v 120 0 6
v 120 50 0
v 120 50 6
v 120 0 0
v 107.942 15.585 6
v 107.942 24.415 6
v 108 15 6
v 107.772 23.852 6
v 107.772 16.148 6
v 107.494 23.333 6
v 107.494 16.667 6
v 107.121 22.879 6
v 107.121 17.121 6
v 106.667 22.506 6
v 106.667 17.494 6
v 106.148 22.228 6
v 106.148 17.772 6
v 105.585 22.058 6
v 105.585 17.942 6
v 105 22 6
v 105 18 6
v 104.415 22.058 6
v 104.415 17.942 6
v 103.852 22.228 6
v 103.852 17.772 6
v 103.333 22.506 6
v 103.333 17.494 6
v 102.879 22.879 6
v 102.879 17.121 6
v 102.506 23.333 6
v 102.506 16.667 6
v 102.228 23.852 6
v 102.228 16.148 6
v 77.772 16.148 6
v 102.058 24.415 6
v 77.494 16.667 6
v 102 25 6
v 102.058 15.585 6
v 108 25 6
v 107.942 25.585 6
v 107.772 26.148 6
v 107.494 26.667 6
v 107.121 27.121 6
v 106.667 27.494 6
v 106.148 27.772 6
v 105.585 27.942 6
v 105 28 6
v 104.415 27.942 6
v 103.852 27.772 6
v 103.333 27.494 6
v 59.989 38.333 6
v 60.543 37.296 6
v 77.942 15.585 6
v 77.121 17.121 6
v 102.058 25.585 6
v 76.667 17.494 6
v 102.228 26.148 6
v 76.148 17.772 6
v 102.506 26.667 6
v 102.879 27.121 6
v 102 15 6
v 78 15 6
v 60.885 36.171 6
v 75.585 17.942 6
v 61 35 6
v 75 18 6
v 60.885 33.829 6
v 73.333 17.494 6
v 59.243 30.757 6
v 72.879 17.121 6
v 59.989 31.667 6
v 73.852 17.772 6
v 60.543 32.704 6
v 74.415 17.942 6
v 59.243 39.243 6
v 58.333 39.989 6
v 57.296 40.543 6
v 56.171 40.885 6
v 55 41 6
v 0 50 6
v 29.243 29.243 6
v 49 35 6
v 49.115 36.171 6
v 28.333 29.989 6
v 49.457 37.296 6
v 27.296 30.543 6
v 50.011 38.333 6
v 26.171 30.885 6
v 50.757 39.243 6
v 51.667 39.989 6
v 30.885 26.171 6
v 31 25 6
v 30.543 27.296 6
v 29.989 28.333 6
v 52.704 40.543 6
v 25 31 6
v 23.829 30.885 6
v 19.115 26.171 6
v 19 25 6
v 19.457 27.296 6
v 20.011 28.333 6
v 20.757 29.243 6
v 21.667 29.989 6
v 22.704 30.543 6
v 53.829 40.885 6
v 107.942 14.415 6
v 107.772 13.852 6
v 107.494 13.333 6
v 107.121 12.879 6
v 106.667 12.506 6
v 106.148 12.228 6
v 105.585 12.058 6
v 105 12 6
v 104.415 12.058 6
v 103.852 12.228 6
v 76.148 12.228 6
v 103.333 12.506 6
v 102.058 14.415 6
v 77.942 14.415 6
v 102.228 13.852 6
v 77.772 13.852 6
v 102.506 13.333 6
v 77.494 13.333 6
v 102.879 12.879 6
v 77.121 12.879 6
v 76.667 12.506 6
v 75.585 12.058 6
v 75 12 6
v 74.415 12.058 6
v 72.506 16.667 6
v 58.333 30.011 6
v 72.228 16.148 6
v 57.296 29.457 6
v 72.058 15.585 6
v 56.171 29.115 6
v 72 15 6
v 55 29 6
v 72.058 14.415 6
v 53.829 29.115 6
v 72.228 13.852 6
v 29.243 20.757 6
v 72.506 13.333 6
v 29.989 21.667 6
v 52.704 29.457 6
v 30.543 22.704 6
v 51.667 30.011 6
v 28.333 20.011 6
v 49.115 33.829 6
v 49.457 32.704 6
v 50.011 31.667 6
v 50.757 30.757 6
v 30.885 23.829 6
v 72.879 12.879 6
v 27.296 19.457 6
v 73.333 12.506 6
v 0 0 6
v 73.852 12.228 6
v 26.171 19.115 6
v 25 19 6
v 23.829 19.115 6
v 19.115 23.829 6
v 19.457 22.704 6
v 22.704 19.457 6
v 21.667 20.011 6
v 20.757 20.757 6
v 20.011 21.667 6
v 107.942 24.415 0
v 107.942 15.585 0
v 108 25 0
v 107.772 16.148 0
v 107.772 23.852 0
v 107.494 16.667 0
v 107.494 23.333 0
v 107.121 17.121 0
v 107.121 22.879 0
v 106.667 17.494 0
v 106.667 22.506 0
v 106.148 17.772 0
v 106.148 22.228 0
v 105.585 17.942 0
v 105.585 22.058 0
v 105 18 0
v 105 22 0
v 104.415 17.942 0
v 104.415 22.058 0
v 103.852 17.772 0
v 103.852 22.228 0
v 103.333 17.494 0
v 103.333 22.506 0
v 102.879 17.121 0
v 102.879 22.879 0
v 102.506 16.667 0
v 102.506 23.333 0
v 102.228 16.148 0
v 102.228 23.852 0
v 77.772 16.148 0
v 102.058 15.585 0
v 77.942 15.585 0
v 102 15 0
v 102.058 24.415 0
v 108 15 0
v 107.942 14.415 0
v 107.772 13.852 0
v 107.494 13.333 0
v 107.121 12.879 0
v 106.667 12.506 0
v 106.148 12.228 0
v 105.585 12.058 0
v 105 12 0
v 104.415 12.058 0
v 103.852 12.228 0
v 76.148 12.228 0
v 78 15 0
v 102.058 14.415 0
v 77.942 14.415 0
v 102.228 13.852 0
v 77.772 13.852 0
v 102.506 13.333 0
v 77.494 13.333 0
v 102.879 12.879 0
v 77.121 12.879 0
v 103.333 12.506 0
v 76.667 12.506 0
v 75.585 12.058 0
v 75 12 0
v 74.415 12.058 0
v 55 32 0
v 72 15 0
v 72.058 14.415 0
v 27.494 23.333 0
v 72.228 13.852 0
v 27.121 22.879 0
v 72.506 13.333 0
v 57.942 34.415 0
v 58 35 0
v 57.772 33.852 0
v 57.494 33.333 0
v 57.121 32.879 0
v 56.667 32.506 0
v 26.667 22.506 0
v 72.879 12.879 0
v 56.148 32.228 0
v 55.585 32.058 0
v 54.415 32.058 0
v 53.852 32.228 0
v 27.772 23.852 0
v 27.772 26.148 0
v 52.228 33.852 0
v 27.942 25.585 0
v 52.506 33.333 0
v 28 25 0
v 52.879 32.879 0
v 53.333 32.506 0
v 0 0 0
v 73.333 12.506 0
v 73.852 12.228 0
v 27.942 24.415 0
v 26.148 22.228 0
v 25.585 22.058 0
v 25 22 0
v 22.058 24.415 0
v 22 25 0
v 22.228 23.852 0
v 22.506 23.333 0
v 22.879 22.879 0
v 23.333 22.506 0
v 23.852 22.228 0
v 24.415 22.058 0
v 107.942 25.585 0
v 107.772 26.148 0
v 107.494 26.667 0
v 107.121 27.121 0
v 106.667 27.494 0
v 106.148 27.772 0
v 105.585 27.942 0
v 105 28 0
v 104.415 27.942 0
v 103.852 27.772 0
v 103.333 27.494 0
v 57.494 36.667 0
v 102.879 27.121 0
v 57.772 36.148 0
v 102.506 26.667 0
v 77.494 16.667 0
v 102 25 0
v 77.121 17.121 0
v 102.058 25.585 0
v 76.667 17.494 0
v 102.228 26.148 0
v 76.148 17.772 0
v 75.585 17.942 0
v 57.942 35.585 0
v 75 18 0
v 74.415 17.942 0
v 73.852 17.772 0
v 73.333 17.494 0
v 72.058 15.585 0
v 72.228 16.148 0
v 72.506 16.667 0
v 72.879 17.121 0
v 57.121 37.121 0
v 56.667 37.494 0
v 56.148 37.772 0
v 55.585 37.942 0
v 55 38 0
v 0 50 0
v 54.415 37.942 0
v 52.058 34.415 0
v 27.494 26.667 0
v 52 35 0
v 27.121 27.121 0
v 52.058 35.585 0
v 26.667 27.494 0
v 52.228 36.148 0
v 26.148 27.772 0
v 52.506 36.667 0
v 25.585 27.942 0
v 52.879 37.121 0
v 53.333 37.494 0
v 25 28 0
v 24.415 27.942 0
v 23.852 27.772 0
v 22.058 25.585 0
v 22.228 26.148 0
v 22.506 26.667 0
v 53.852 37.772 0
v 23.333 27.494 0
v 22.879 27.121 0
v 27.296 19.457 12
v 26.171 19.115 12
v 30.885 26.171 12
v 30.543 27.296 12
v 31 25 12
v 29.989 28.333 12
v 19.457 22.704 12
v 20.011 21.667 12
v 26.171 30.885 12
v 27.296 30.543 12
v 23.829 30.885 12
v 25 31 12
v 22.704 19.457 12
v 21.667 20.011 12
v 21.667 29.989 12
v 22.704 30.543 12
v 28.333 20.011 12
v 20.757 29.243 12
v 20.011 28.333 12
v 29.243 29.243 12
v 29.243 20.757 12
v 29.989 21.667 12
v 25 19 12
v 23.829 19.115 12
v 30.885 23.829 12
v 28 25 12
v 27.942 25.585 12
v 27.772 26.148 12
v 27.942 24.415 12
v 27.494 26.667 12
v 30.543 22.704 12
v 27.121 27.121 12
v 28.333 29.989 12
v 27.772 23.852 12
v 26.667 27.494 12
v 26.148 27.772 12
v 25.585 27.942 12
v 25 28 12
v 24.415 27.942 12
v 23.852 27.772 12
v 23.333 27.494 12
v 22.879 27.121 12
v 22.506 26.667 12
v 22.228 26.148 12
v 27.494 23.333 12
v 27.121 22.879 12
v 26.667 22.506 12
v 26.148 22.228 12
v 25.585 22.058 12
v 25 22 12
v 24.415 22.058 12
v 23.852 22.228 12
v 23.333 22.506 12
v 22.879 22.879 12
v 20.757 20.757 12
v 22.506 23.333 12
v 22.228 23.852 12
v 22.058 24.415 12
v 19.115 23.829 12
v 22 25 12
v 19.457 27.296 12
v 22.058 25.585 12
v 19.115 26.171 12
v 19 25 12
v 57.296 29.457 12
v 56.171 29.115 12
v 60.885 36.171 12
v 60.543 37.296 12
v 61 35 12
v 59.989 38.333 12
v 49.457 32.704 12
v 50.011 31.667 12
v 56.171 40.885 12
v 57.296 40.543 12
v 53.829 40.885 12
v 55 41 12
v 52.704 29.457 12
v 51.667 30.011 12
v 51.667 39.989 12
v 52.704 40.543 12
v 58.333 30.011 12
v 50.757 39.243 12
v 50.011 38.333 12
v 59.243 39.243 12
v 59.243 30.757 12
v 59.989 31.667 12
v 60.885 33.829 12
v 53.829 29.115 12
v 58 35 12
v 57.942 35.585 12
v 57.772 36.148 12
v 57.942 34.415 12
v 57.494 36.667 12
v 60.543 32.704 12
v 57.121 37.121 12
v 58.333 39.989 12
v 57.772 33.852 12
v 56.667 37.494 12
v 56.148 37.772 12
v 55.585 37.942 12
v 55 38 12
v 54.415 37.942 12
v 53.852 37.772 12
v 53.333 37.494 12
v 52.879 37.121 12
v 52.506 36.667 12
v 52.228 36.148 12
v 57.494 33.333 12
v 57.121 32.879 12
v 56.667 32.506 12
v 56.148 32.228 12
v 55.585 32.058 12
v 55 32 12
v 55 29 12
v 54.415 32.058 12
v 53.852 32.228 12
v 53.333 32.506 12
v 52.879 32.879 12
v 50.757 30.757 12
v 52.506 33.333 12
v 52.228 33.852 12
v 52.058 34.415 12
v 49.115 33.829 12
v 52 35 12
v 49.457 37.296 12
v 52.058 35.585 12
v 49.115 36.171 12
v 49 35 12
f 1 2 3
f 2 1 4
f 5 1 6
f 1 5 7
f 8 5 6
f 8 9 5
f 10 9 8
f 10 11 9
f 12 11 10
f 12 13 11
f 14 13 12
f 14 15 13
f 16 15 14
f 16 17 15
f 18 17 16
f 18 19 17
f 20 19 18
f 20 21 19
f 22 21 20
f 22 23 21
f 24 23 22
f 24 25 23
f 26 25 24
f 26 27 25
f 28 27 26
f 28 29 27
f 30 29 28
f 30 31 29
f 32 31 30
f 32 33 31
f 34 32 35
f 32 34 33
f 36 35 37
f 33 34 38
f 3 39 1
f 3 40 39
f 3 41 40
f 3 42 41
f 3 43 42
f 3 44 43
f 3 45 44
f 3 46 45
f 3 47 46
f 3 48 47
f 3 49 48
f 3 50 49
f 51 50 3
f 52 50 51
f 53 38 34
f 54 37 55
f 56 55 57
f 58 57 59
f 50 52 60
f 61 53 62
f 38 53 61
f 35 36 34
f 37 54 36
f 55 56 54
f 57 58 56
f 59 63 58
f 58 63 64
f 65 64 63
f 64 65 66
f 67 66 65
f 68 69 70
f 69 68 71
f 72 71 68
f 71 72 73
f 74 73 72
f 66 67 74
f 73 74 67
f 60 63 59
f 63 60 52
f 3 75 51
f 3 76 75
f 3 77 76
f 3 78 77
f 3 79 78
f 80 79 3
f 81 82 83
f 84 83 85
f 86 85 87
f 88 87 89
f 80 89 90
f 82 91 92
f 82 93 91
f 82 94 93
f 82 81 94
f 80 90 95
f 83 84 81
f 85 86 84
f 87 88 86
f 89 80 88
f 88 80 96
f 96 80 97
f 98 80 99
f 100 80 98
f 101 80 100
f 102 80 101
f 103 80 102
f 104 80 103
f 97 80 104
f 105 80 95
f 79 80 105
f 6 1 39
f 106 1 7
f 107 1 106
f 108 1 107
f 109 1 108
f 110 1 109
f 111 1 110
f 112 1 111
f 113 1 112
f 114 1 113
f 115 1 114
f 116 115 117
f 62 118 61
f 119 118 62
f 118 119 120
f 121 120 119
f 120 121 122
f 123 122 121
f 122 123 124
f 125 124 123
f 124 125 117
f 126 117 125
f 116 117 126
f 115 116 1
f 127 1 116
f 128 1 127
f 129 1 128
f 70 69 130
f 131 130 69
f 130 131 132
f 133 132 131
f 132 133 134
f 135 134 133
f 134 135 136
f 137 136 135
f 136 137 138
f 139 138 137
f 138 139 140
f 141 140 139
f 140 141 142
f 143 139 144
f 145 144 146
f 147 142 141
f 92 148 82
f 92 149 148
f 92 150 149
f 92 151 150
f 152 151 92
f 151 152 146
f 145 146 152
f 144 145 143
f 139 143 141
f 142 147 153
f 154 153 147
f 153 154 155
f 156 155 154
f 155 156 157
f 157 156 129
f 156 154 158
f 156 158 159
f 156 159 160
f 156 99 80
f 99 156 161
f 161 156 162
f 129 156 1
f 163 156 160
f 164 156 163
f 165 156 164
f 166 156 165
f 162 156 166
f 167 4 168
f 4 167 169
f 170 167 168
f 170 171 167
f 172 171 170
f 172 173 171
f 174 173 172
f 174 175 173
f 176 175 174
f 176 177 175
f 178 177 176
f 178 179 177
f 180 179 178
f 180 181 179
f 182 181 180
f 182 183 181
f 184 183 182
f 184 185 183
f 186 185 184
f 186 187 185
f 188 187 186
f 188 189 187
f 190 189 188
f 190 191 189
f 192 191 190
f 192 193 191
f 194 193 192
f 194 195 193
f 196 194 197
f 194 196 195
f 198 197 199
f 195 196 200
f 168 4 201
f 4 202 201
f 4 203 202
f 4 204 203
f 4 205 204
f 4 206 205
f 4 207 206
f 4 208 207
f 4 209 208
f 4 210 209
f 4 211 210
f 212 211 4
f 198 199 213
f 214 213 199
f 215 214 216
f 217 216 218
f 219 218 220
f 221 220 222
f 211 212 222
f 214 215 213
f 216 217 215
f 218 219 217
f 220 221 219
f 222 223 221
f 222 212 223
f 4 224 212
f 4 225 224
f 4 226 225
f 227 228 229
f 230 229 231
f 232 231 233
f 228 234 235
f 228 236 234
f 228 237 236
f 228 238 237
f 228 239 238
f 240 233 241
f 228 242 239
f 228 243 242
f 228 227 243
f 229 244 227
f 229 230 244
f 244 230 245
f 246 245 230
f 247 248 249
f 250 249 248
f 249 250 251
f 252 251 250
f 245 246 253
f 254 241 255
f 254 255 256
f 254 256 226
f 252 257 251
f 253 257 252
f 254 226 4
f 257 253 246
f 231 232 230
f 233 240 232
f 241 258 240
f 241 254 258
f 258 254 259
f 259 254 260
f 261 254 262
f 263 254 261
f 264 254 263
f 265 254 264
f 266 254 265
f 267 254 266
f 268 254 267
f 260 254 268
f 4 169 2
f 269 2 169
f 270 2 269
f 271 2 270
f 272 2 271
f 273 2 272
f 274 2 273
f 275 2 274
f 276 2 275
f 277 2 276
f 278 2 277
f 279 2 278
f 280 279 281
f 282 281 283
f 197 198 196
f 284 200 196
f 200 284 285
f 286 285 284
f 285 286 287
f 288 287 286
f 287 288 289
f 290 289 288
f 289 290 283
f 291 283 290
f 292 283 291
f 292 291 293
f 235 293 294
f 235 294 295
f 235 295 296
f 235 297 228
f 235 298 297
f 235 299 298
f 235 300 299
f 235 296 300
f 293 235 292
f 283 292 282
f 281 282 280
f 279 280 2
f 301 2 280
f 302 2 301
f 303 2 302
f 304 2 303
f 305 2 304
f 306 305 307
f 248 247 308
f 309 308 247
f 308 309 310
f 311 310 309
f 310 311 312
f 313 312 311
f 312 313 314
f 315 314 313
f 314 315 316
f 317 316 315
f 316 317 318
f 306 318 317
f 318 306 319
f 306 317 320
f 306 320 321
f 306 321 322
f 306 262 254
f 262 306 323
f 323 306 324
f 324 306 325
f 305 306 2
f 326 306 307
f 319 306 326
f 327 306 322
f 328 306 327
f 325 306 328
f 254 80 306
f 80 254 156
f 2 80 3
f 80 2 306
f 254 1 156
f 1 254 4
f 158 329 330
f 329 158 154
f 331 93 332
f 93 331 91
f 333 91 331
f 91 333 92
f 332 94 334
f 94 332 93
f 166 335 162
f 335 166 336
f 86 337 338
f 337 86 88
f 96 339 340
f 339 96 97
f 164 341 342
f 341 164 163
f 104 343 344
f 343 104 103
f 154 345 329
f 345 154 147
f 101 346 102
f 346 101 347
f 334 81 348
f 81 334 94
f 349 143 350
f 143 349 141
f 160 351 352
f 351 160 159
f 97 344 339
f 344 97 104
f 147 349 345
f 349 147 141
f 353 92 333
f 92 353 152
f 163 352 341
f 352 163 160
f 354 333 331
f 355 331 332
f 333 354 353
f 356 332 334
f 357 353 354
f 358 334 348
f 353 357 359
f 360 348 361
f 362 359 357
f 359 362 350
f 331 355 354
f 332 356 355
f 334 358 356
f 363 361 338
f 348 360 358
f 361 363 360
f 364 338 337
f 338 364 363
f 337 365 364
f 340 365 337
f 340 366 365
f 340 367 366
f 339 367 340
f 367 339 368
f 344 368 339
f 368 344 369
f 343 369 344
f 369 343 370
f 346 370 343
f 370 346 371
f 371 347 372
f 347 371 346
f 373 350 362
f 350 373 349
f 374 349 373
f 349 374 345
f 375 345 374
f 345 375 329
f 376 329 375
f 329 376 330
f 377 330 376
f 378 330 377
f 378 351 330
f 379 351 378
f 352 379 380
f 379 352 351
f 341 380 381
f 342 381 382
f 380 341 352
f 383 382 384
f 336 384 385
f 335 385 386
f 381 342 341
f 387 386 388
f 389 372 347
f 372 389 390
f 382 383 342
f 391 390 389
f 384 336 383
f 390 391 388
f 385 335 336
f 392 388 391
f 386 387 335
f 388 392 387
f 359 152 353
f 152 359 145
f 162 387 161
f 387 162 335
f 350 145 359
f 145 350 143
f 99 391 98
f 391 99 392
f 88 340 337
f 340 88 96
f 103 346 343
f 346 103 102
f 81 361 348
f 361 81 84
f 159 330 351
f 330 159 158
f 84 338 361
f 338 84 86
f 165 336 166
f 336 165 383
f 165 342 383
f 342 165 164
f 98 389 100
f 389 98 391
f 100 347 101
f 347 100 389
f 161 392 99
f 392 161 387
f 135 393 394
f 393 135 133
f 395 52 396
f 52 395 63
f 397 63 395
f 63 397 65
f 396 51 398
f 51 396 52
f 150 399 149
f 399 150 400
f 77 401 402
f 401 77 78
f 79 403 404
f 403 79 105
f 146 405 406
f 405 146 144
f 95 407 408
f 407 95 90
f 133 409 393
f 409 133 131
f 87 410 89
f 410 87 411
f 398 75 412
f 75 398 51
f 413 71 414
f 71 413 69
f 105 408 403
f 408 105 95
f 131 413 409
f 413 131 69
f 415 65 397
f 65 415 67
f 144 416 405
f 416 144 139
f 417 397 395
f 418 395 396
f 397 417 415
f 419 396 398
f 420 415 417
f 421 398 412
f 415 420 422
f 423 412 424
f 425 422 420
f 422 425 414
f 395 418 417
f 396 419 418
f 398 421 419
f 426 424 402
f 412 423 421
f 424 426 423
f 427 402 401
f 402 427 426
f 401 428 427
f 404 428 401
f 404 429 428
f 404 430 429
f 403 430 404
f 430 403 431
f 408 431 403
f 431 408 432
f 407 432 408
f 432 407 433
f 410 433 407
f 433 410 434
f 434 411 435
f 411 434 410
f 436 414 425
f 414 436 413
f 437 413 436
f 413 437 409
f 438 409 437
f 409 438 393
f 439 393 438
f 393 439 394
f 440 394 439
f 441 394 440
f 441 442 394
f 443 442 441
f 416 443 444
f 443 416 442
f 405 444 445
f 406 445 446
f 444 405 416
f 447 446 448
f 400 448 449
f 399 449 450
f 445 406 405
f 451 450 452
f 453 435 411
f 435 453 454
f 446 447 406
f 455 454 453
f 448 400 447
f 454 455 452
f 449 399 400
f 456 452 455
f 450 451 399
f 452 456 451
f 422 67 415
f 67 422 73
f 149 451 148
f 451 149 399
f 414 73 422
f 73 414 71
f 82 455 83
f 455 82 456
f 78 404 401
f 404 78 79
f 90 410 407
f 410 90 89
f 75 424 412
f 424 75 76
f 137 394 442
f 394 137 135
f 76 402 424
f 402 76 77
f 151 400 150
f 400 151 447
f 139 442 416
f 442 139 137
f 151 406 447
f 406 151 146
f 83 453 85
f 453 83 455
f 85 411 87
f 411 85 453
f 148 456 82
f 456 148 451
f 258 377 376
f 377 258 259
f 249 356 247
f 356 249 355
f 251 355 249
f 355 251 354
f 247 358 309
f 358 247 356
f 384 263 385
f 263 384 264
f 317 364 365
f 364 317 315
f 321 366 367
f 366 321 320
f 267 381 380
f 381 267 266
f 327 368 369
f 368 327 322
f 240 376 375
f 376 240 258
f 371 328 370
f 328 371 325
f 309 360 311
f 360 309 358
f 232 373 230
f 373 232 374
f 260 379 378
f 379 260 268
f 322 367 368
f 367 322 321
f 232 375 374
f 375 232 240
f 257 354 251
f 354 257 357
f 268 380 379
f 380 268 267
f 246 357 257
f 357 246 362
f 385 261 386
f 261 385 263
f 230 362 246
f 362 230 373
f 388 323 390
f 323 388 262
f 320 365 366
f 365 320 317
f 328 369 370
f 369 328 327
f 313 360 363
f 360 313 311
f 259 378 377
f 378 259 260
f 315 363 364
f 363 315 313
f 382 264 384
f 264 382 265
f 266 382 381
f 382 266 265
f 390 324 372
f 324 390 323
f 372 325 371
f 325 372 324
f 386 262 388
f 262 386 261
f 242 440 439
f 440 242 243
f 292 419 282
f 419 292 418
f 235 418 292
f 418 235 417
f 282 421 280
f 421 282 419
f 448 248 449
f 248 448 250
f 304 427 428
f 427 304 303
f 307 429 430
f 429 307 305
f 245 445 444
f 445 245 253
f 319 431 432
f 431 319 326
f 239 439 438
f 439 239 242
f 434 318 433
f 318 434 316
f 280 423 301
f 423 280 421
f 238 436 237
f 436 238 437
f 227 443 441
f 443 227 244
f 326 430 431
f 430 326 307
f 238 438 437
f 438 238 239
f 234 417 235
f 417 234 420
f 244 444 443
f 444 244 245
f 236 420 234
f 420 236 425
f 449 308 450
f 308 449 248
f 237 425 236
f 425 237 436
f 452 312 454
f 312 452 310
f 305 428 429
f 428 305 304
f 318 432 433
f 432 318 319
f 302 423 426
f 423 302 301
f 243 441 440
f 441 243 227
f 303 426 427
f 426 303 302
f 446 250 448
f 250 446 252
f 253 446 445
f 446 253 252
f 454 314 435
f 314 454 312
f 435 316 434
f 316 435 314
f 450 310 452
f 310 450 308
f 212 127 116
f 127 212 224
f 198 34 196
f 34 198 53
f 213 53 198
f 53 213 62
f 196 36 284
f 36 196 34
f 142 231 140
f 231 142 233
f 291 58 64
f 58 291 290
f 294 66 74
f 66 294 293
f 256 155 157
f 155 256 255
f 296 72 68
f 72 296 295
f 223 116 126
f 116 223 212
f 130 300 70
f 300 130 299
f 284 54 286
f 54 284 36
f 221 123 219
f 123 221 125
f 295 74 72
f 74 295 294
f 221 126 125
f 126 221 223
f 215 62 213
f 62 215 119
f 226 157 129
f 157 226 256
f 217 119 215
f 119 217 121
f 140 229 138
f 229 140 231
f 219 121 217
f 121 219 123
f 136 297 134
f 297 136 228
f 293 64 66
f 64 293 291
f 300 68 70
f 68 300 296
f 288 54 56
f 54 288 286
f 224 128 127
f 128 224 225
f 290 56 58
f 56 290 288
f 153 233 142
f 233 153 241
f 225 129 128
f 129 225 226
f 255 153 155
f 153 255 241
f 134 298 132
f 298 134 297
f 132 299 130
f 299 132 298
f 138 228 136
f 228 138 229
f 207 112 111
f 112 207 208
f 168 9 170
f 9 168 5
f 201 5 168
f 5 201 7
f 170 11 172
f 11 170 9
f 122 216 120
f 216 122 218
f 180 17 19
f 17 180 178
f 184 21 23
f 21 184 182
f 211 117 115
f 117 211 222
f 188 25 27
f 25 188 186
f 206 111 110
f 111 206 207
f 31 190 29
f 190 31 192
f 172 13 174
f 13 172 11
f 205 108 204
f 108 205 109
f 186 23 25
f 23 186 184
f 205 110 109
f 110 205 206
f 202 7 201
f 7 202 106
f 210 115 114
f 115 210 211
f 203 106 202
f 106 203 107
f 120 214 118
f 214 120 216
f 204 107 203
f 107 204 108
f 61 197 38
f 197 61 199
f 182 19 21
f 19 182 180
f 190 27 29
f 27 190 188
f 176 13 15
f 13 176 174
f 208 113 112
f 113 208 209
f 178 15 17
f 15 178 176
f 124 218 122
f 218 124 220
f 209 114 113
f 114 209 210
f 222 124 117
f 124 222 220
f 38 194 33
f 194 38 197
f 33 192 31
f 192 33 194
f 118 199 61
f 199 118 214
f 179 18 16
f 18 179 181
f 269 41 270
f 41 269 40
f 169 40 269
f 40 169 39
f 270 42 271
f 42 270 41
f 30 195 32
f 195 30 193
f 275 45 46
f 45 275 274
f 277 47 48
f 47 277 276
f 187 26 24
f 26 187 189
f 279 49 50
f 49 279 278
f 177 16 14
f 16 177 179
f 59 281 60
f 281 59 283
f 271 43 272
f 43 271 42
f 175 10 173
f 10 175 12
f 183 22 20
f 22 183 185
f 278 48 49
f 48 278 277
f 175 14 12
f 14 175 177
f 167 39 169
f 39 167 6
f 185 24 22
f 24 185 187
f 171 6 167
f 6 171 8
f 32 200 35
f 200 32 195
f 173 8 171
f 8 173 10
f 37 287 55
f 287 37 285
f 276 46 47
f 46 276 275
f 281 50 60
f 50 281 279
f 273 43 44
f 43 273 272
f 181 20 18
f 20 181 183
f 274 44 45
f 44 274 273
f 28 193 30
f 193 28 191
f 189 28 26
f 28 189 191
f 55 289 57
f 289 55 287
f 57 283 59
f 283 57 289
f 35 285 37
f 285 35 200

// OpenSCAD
$fn = 32;

// ----------------------------------------------------------------------
// Mixed field: bosses and holes at given coordinates
// ----------------------------------------------------------------------

// --- parameters (mm) ---
plate_l = 120;            // plate length, X
plate_w = 50;             // plate width, Y
plate_t = 6;              // plate thickness, Z
boss_d = 12;              // boss diameter
boss_h = 6;               // boss height above the plate
hole_d = 6;               // through hole diameter

total_h = plate_t + boss_h;  // overall height

difference() {
  union() {
    cube([plate_l, plate_w, plate_t]);
    translate([25, 25, plate_t]) cylinder(h = boss_h, d = boss_d);
    translate([55, 35, plate_t]) cylinder(h = boss_h, d = boss_d);
  }
  translate([25, 25, -1]) cylinder(h = total_h + 2, d = boss_d / 2);
  translate([55, 35, -1]) cylinder(h = total_h + 2, d = boss_d / 2);
  translate([75, 15, -1]) cylinder(h = plate_t + 2, d = hole_d);
  translate([105, 15, -1]) cylinder(h = plate_t + 2, d = hole_d);
  translate([105, 25, -1]) cylinder(h = plate_t + 2, d = hole_d);
}
